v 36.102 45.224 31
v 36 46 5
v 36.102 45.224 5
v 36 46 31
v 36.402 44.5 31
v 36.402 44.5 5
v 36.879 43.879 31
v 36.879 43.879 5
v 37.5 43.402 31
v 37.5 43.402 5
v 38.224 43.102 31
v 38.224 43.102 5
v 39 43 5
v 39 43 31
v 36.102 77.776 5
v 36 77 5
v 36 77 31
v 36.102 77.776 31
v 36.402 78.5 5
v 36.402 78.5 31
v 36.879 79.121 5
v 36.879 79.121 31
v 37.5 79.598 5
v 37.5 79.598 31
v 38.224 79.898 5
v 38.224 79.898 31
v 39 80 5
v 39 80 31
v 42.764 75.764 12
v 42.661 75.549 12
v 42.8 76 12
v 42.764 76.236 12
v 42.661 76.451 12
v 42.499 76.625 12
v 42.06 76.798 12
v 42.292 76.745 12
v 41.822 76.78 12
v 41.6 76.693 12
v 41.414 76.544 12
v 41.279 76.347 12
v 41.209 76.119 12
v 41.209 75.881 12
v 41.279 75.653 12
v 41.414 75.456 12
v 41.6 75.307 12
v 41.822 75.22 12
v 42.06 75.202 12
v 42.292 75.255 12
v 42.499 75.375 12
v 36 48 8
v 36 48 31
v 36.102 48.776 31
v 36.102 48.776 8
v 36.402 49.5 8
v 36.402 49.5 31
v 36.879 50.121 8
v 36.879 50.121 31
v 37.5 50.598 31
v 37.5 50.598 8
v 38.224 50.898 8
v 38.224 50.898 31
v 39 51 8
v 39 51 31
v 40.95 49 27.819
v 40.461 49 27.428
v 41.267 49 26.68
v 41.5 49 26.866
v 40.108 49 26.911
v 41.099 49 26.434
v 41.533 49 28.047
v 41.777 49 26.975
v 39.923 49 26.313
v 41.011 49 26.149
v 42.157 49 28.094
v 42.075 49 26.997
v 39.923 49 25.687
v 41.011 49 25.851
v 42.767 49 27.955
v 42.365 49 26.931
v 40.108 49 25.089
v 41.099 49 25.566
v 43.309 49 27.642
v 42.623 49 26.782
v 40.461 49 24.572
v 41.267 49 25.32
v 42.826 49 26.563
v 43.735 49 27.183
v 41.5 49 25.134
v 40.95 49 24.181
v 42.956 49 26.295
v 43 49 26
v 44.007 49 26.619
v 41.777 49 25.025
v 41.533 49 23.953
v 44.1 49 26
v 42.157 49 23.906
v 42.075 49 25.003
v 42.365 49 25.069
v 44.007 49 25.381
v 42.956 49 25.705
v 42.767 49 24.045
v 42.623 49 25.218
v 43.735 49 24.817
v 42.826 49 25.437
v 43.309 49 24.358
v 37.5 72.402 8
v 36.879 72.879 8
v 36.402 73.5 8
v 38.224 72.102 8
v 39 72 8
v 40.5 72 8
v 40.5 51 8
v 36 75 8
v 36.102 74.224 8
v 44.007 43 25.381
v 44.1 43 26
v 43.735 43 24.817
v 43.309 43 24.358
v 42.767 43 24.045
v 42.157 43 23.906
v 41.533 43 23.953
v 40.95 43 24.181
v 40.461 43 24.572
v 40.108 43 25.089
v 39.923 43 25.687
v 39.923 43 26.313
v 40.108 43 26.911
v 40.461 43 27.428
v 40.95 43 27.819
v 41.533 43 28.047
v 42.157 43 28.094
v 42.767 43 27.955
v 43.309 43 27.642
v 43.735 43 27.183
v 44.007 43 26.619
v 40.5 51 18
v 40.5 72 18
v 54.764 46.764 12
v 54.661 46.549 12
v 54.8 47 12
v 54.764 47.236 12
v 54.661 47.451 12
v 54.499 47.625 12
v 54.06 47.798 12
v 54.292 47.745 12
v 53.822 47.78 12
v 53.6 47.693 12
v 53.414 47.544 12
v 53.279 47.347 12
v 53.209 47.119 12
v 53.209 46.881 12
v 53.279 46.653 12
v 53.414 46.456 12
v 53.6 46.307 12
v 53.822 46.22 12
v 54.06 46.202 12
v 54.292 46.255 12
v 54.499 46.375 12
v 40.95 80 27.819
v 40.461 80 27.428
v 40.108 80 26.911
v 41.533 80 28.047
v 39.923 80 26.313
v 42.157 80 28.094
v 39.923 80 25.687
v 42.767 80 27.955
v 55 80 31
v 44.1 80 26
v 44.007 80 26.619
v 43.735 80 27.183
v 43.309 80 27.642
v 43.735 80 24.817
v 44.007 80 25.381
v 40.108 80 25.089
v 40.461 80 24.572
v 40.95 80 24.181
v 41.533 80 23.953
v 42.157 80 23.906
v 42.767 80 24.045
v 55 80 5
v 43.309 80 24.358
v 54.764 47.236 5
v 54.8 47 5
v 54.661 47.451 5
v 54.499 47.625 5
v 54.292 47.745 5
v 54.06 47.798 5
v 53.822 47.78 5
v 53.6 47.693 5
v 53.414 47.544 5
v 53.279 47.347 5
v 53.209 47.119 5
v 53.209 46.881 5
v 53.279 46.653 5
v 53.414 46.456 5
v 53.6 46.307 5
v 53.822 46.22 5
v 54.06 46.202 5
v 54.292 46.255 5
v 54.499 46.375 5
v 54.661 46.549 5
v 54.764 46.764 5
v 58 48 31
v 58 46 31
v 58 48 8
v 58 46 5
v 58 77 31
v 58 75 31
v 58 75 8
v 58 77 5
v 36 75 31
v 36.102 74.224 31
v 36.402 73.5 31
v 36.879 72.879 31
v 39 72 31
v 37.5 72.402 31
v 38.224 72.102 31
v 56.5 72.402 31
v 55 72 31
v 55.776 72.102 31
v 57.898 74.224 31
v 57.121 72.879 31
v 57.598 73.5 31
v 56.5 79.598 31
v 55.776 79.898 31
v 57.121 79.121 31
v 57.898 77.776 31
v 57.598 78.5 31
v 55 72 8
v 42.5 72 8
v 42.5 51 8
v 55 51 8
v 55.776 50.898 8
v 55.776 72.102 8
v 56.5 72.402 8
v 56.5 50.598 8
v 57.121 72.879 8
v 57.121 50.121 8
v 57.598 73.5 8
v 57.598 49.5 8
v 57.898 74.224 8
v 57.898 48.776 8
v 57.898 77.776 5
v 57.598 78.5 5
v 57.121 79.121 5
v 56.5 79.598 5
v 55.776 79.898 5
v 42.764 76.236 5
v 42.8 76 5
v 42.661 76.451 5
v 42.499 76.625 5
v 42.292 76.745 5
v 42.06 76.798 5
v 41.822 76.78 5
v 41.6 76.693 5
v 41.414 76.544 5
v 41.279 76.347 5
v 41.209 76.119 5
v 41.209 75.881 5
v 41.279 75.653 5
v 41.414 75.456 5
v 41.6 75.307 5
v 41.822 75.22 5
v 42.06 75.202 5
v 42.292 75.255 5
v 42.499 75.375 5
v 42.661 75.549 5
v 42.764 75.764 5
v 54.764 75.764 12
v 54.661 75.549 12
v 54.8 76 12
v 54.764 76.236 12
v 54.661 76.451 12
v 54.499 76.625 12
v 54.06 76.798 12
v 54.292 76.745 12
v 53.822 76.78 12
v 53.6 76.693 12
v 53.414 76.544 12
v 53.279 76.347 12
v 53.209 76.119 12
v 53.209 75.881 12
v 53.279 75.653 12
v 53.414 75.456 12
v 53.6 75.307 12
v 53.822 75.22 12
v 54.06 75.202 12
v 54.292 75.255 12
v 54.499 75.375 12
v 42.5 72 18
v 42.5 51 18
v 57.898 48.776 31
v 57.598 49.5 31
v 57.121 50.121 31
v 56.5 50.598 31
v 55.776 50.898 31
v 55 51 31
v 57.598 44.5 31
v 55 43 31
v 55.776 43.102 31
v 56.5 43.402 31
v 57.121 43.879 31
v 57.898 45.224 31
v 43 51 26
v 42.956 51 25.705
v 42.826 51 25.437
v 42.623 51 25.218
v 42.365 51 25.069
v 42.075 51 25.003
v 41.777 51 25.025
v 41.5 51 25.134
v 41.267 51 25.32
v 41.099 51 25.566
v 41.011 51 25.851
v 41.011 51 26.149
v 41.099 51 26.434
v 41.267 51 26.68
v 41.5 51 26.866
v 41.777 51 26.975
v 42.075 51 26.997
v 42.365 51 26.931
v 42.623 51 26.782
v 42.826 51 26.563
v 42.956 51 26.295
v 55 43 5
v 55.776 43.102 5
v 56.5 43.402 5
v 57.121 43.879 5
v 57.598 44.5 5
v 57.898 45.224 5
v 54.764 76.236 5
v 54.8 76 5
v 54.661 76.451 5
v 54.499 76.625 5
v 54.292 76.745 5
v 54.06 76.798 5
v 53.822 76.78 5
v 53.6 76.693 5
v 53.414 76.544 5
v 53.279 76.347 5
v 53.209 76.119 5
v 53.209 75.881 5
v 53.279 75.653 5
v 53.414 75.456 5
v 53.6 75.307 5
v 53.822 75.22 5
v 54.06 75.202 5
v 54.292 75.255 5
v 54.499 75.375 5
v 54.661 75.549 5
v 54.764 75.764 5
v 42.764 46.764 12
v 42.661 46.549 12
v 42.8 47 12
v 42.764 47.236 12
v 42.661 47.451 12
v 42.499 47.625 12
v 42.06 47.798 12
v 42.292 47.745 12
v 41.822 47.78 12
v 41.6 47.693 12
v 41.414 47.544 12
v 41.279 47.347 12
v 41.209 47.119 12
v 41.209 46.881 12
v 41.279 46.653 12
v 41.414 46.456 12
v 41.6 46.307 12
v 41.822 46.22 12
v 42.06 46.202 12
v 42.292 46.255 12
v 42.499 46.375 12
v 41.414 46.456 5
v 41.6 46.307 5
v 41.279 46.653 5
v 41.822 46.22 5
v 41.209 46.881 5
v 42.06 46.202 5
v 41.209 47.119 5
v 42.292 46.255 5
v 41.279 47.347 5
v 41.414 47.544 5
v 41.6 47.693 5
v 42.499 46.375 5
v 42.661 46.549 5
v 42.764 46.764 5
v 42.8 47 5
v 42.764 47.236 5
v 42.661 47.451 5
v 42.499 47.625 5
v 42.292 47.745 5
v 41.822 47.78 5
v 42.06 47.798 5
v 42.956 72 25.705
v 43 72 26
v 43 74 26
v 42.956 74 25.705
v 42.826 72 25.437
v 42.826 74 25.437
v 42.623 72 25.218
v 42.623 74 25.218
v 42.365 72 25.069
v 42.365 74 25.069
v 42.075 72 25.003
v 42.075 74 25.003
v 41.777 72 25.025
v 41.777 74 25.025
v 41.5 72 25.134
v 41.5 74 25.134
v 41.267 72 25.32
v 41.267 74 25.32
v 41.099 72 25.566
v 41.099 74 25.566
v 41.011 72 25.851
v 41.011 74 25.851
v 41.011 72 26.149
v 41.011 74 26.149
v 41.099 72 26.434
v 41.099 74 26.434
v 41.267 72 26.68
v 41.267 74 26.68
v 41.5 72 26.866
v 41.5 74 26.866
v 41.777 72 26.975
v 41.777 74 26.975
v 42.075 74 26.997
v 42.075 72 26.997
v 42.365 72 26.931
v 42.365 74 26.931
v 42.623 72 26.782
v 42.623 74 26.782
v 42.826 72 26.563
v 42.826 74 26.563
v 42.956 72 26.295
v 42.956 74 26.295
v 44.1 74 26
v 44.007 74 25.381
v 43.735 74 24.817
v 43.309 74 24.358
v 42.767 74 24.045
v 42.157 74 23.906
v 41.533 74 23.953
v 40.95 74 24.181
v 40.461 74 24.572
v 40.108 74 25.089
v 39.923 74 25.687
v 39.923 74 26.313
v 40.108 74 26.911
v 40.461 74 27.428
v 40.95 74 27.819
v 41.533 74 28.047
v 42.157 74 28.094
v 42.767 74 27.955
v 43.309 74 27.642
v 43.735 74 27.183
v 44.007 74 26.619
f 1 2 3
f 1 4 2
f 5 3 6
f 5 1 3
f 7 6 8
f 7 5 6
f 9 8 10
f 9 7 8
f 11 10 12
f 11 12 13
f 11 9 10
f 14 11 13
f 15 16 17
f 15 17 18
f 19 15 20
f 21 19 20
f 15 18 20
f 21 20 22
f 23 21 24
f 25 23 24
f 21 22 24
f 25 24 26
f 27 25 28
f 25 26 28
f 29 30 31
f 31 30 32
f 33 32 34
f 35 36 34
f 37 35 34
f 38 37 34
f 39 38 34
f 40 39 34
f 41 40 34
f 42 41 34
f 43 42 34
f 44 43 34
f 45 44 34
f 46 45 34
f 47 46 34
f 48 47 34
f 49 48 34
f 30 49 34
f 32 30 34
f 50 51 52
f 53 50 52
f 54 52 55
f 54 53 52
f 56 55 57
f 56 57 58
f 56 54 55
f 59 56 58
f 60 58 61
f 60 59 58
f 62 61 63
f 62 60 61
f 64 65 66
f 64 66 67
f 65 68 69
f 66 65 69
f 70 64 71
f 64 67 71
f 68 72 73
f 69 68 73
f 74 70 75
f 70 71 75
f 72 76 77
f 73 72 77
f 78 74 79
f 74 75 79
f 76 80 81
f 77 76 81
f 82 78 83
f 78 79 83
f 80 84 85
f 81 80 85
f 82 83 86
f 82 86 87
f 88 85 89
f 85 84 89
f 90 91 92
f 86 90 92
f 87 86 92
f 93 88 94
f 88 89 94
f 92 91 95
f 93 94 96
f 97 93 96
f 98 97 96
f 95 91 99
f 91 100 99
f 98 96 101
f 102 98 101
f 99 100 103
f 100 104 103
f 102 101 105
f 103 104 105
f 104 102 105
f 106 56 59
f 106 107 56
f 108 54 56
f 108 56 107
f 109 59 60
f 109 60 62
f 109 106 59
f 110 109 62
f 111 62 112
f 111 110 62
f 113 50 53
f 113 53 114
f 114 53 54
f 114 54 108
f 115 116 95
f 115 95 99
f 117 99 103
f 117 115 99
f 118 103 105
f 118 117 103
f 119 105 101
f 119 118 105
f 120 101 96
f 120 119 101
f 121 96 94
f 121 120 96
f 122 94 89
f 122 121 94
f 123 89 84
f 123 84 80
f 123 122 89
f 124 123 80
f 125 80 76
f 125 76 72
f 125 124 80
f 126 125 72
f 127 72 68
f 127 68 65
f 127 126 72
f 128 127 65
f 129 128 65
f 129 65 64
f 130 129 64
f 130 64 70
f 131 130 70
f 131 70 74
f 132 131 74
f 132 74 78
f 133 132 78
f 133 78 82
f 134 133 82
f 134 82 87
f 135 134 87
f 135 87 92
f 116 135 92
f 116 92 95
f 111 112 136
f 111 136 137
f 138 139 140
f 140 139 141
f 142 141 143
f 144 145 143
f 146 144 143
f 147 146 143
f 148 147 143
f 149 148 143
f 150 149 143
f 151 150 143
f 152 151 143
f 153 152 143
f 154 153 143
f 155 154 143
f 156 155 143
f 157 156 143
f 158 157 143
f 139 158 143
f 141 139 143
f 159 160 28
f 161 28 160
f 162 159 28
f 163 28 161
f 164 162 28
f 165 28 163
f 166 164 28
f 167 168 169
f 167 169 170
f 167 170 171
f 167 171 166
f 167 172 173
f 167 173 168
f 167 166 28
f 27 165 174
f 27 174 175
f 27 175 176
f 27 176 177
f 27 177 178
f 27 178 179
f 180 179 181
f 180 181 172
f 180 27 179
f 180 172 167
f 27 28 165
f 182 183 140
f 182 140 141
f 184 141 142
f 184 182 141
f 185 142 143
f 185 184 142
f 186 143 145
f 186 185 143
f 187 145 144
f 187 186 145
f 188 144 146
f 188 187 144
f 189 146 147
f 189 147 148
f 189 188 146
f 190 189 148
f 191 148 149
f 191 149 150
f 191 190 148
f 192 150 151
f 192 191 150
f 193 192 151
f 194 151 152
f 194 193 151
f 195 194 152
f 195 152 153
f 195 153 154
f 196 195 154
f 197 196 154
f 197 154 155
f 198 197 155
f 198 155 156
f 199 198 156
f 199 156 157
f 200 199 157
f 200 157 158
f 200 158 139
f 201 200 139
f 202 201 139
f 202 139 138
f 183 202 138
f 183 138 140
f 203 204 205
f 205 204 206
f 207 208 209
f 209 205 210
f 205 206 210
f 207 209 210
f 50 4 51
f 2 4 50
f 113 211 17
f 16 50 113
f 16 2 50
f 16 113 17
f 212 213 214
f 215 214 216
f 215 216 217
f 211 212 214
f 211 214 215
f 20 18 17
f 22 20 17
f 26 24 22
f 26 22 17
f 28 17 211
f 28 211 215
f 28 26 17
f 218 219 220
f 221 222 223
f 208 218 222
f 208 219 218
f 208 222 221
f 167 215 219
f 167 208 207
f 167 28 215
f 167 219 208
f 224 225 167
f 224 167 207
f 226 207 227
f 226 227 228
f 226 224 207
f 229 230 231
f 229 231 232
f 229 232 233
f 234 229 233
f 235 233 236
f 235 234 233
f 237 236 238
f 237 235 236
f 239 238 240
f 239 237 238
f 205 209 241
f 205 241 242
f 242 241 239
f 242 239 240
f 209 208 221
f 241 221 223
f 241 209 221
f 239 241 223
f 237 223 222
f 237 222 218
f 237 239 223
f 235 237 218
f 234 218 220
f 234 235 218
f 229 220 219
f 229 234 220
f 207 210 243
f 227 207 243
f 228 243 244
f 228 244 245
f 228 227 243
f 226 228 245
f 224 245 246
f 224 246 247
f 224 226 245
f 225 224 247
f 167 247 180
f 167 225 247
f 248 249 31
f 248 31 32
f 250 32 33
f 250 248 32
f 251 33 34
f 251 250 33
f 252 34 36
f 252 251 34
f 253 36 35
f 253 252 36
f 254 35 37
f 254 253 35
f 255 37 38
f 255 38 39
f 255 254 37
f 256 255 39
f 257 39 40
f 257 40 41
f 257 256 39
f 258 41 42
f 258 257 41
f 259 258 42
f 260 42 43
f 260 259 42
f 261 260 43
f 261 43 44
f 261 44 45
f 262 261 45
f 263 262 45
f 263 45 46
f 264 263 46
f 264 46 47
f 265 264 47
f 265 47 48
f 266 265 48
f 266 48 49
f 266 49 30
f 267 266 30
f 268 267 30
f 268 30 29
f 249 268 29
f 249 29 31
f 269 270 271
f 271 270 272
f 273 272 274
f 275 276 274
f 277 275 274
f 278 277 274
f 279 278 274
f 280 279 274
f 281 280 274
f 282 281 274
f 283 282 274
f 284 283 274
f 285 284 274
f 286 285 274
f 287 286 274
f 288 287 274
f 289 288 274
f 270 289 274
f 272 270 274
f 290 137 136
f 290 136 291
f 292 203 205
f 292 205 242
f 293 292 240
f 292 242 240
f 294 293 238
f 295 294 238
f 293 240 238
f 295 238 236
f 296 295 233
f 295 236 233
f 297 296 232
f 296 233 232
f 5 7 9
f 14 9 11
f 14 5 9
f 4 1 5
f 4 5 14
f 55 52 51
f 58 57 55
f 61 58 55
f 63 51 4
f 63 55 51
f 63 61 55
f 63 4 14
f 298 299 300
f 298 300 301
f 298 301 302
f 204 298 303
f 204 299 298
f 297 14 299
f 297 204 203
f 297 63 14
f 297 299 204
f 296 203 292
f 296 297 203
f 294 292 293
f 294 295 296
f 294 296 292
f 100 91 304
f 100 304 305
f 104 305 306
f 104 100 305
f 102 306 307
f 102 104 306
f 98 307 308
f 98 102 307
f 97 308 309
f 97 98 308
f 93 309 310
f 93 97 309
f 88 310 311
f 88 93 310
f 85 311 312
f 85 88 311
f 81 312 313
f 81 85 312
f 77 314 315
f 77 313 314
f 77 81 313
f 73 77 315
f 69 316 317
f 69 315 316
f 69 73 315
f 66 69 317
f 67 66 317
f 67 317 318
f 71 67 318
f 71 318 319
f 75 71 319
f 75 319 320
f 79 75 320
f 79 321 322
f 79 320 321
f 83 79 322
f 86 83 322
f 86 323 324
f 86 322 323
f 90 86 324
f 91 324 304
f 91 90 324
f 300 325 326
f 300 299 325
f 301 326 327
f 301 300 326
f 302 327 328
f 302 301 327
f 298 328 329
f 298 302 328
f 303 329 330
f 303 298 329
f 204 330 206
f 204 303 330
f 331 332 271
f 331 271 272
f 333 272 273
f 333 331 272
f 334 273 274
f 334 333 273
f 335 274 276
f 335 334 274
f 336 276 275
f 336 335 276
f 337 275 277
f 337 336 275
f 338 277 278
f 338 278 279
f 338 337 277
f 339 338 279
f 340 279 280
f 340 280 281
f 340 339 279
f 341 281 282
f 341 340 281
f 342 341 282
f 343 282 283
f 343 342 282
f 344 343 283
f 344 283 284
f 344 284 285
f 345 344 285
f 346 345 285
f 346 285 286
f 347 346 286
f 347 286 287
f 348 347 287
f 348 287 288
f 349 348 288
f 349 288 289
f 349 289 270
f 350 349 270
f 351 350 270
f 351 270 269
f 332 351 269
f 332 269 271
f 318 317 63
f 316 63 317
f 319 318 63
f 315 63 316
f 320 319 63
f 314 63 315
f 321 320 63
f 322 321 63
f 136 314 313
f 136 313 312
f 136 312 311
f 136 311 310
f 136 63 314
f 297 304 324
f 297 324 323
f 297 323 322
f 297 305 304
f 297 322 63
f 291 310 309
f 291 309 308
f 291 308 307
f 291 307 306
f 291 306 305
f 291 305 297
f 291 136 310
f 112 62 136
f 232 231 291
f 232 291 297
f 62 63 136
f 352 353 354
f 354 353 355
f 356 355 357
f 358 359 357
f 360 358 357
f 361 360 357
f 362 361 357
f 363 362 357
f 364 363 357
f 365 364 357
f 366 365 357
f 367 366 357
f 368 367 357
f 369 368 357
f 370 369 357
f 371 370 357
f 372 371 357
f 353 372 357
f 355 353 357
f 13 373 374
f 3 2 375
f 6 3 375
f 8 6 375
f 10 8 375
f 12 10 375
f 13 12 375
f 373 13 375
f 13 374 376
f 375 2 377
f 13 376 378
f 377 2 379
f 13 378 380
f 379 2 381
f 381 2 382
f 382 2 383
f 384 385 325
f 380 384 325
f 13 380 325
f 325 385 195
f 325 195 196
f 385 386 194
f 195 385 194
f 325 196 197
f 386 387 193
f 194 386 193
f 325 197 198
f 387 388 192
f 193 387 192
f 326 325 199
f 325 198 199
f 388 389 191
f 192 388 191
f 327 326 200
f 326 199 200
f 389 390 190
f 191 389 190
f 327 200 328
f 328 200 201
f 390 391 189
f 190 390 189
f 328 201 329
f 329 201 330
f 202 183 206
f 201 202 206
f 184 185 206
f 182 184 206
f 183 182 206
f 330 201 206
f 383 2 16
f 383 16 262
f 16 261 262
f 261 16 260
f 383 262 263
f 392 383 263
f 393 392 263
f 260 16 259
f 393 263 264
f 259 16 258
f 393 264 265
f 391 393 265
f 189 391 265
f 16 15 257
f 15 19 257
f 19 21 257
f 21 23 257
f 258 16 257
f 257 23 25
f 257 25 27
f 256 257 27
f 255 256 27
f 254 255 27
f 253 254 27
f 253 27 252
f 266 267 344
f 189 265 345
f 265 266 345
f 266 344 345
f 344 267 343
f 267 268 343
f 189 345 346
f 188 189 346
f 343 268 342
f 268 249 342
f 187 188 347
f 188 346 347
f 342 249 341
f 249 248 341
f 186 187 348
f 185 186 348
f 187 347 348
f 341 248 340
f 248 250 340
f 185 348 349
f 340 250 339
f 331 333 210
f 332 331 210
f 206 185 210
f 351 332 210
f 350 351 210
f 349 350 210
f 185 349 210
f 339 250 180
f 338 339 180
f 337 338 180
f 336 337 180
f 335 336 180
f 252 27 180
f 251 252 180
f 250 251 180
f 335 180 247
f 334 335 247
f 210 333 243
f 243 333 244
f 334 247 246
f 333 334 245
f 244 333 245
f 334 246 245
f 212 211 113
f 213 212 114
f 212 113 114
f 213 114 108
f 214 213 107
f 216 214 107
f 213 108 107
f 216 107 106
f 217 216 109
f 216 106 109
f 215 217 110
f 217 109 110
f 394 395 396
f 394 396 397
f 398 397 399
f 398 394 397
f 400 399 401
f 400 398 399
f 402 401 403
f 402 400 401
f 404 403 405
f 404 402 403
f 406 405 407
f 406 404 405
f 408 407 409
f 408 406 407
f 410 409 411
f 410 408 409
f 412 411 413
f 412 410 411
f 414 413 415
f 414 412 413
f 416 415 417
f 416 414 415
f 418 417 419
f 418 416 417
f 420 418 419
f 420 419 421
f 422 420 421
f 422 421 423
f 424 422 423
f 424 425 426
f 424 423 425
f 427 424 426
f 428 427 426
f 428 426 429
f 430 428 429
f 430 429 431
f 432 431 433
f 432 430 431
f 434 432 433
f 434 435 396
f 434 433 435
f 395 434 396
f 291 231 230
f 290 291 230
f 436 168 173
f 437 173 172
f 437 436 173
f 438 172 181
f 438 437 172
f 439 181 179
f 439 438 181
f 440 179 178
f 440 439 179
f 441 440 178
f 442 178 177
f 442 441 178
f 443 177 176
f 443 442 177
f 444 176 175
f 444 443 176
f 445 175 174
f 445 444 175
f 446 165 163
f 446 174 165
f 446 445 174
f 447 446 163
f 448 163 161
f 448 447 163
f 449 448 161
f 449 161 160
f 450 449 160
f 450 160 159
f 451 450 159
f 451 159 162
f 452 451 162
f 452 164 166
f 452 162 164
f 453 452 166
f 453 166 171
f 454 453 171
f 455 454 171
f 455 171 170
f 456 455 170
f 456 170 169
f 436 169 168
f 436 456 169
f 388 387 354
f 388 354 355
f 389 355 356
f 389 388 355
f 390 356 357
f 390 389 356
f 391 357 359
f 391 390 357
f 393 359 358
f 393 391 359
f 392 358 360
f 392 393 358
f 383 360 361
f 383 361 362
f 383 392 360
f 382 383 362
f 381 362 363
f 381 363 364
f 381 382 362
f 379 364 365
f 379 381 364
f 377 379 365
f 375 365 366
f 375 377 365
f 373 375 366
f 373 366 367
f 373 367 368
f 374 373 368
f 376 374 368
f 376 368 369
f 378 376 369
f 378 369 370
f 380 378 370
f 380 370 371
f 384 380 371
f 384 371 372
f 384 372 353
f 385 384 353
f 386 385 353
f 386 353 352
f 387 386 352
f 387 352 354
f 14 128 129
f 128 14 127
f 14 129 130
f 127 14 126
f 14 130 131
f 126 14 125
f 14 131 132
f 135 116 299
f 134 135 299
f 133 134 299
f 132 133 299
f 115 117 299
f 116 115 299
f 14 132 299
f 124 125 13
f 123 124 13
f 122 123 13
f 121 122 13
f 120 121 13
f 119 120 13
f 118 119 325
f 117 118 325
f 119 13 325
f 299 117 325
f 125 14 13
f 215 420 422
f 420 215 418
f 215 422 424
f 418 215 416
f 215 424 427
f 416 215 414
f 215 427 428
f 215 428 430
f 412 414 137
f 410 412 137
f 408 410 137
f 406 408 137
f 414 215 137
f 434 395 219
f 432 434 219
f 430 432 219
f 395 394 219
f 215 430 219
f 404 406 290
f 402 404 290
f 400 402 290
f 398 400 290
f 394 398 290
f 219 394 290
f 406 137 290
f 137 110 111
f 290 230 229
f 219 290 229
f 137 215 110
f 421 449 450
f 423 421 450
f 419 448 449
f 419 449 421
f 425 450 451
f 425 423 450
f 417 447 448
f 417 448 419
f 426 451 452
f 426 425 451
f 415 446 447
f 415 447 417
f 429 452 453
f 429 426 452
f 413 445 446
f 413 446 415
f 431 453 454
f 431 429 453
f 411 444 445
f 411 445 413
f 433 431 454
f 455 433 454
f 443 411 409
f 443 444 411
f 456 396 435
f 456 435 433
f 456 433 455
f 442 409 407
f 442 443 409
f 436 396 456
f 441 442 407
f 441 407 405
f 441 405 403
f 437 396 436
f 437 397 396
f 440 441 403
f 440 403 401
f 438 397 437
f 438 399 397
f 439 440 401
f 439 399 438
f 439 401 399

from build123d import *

# Parameters (mm, degrees)
CYLINDER027_R     = 0.8
CYLINDER027_DEPTH = 12
CYLINDER028_R     = 0.8
CYLINDER028_DEPTH = 12
CYLINDER029_R     = 0.8
CYLINDER029_DEPTH = 12
CYLINDER039_R     = 1
CYLINDER039_DEPTH = 45
CYLINDER040_R     = 2.1
CYLINDER040_DEPTH = 8
CYLINDER041_R     = 2.1
CYLINDER041_DEPTH = 8
CYLINDER026_R     = 0.8
CYLINDER026_DEPTH = 12
BOX043_W          = 2
BOX043_H          = 23
BOX043_DEPTH      = 13
BOX042_W          = 25
BOX042_H          = 21
BOX042_DEPTH      = 28
BOX030_W          = 22
BOX030_H          = 37
BOX030_DEPTH      = 26
FILLET002024_R    = 3
FILLET002034_R    = 3


with BuildPart() as screwholle008:
    # Cylinder027 → Cylinder027 (new body)
    with BuildSketch(Plane(origin=(54, 47, 0), x_dir=(1, 0, 0), z_dir=(0, 0, 1))):
        Circle(CYLINDER027_R)
    extrude(amount=CYLINDER027_DEPTH)


with BuildPart() as screwholle009:
    # Cylinder028 → Cylinder028 (new body)
    with BuildSketch(Plane(origin=(42, 76, 0), x_dir=(1, 0, 0), z_dir=(0, 0, 1))):
        Circle(CYLINDER028_R)
    extrude(amount=CYLINDER028_DEPTH)


with BuildPart() as screwholle010:
    # Cylinder029 → Cylinder029 (new body)
    with BuildSketch(Plane(origin=(54, 76, 0), x_dir=(1, 0, 0), z_dir=(0, 0, 1))):
        Circle(CYLINDER029_R)
    extrude(amount=CYLINDER029_DEPTH)


with BuildPart() as screwholle020:
    # Cylinder039 → Cylinder039 (new body)
    with BuildSketch(Plane(origin=(42, 40, 26), x_dir=(1, 0, 0), z_dir=(0, 1, 0))):
        Circle(CYLINDER039_R)
    extrude(amount=CYLINDER039_DEPTH)


with BuildPart() as screwholle021:
    # Cylinder040 → Cylinder040 (new body)
    with BuildSketch(Plane(origin=(42, 41, 26), x_dir=(1, 0, 0), z_dir=(0, 1, 0))):
        Circle(CYLINDER040_R)
    extrude(amount=CYLINDER040_DEPTH)


with BuildPart() as screwholle022:
    # Cylinder041 → Cylinder041 (new body)
    with BuildSketch(Plane(origin=(42, 74, 26), x_dir=(1, 0, 0), z_dir=(0, 1, 0))):
        Circle(CYLINDER041_R)
    extrude(amount=CYLINDER041_DEPTH)


with BuildPart() as fusion029:
    # Cylinder026 → Cylinder026 (new body)
    with BuildSketch(Plane(origin=(42, 47, 0), x_dir=(1, 0, 0), z_dir=(0, 0, 1))):
        Circle(CYLINDER026_R)
    extrude(amount=CYLINDER026_DEPTH)

    # Fusion029: union ScrewHolle008, ScrewHolle009, ScrewHolle010, ScrewHolle020, ScrewHolle021, ScrewHolle022
    add(screwholle008.part)
    add(screwholle009.part)
    add(screwholle010.part)
    add(screwholle020.part)
    add(screwholle021.part)
    add(screwholle022.part)


with BuildPart() as cube036:
    # Box043 → Box043 (new body)
    with BuildSketch(Plane(origin=(40.5, 50, 5), x_dir=(1, 0, 0), z_dir=(0, 0, 1))):
        with Locations((1, 11.5)):
            Rectangle(BOX043_W, BOX043_H)
    extrude(amount=BOX043_DEPTH)


with BuildPart() as cube035:
    # Box042 → Box042 (new body)
    with BuildSketch(Plane(origin=(35, 51, 8), x_dir=(1, 0, 0), z_dir=(0, 0, 1))):
        with Locations((12.5, 10.5)):
            Rectangle(BOX042_W, BOX042_H)
    extrude(amount=BOX042_DEPTH)


with BuildPart() as btnbox:
    # Box030 → Box030 (new body)
    with BuildSketch(Plane(origin=(36, 43, 5), x_dir=(1, 0, 0), z_dir=(0, 0, 1))):
        with Locations((11, 18.5)):
            Rectangle(BOX030_W, BOX030_H)
    extrude(amount=BOX030_DEPTH)

    # Fillet002024
    fillet002024_edges = [btnbox.edges().sort_by_distance(p)[0] for p in [
        (36, 43, 18),
        (36, 80, 18),
        (58, 43, 18),
        (58, 80, 18),
    ]]
    fillet(fillet002024_edges, radius=FILLET002024_R)

    # Cut007: cut Cube035
    add(cube035.part, mode=Mode.SUBTRACT)

    # Fusion028: union Cube036
    add(cube036.part)

    # Fillet002034
    fillet002034_edges = [btnbox.edges().sort_by_distance(p)[0] for p in [
        (36, 51, 19.5),
        (36, 72, 19.5),
        (58, 51, 19.5),
        (58, 72, 19.5),
    ]]
    fillet(fillet002034_edges, radius=FILLET002034_R)

    # Cut008: cut Fusion029
    add(fusion029.part, mode=Mode.SUBTRACT)


solid = btnbox.part
